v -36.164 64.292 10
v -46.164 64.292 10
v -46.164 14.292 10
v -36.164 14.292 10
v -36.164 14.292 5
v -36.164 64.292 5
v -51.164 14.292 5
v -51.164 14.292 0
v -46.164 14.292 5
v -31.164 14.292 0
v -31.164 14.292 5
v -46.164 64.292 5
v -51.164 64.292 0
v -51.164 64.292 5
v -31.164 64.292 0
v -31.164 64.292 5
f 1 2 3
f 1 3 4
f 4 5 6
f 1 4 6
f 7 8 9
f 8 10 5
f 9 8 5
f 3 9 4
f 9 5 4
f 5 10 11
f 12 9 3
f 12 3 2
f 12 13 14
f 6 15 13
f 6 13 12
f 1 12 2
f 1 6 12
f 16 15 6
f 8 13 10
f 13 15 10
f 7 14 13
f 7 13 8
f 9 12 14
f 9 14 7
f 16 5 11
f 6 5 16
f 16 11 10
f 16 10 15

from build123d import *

# Parameters (mm, degrees)
F0_W     = 10
F0_H     = 50
F1_DEPTH = 10
F2_W     = 50
F2_H     = 5
F3_DEPTH = 5
F4_W     = 50
F4_H     = 5
F5_DEPTH = 5


with BuildPart() as f1:
    # F0 (on Top) → F1 (new body)
    with BuildSketch(Plane.XY):
        with Locations((-41.163797, 39.292196)):
            Rectangle(F0_W, F0_H)
    extrude(amount=F1_DEPTH)

    # F2 (on face) → F3 (join)
    with BuildSketch(Plane.YZ.offset(-36.163797)):
        with Locations((39.292196, 2.5)):
            Rectangle(F2_W, F2_H)
    extrude(amount=F3_DEPTH)

    # F4 (on face) → F5 (join)
    with BuildSketch(Plane(origin=(-46.163797, 0, 0), x_dir=(0, -1, 0), z_dir=(-1, 0, 0))):
        with Locations((-39.292196, 2.5)):
            Rectangle(F4_W, F4_H)
    extrude(amount=F5_DEPTH)


solid = f1.part
